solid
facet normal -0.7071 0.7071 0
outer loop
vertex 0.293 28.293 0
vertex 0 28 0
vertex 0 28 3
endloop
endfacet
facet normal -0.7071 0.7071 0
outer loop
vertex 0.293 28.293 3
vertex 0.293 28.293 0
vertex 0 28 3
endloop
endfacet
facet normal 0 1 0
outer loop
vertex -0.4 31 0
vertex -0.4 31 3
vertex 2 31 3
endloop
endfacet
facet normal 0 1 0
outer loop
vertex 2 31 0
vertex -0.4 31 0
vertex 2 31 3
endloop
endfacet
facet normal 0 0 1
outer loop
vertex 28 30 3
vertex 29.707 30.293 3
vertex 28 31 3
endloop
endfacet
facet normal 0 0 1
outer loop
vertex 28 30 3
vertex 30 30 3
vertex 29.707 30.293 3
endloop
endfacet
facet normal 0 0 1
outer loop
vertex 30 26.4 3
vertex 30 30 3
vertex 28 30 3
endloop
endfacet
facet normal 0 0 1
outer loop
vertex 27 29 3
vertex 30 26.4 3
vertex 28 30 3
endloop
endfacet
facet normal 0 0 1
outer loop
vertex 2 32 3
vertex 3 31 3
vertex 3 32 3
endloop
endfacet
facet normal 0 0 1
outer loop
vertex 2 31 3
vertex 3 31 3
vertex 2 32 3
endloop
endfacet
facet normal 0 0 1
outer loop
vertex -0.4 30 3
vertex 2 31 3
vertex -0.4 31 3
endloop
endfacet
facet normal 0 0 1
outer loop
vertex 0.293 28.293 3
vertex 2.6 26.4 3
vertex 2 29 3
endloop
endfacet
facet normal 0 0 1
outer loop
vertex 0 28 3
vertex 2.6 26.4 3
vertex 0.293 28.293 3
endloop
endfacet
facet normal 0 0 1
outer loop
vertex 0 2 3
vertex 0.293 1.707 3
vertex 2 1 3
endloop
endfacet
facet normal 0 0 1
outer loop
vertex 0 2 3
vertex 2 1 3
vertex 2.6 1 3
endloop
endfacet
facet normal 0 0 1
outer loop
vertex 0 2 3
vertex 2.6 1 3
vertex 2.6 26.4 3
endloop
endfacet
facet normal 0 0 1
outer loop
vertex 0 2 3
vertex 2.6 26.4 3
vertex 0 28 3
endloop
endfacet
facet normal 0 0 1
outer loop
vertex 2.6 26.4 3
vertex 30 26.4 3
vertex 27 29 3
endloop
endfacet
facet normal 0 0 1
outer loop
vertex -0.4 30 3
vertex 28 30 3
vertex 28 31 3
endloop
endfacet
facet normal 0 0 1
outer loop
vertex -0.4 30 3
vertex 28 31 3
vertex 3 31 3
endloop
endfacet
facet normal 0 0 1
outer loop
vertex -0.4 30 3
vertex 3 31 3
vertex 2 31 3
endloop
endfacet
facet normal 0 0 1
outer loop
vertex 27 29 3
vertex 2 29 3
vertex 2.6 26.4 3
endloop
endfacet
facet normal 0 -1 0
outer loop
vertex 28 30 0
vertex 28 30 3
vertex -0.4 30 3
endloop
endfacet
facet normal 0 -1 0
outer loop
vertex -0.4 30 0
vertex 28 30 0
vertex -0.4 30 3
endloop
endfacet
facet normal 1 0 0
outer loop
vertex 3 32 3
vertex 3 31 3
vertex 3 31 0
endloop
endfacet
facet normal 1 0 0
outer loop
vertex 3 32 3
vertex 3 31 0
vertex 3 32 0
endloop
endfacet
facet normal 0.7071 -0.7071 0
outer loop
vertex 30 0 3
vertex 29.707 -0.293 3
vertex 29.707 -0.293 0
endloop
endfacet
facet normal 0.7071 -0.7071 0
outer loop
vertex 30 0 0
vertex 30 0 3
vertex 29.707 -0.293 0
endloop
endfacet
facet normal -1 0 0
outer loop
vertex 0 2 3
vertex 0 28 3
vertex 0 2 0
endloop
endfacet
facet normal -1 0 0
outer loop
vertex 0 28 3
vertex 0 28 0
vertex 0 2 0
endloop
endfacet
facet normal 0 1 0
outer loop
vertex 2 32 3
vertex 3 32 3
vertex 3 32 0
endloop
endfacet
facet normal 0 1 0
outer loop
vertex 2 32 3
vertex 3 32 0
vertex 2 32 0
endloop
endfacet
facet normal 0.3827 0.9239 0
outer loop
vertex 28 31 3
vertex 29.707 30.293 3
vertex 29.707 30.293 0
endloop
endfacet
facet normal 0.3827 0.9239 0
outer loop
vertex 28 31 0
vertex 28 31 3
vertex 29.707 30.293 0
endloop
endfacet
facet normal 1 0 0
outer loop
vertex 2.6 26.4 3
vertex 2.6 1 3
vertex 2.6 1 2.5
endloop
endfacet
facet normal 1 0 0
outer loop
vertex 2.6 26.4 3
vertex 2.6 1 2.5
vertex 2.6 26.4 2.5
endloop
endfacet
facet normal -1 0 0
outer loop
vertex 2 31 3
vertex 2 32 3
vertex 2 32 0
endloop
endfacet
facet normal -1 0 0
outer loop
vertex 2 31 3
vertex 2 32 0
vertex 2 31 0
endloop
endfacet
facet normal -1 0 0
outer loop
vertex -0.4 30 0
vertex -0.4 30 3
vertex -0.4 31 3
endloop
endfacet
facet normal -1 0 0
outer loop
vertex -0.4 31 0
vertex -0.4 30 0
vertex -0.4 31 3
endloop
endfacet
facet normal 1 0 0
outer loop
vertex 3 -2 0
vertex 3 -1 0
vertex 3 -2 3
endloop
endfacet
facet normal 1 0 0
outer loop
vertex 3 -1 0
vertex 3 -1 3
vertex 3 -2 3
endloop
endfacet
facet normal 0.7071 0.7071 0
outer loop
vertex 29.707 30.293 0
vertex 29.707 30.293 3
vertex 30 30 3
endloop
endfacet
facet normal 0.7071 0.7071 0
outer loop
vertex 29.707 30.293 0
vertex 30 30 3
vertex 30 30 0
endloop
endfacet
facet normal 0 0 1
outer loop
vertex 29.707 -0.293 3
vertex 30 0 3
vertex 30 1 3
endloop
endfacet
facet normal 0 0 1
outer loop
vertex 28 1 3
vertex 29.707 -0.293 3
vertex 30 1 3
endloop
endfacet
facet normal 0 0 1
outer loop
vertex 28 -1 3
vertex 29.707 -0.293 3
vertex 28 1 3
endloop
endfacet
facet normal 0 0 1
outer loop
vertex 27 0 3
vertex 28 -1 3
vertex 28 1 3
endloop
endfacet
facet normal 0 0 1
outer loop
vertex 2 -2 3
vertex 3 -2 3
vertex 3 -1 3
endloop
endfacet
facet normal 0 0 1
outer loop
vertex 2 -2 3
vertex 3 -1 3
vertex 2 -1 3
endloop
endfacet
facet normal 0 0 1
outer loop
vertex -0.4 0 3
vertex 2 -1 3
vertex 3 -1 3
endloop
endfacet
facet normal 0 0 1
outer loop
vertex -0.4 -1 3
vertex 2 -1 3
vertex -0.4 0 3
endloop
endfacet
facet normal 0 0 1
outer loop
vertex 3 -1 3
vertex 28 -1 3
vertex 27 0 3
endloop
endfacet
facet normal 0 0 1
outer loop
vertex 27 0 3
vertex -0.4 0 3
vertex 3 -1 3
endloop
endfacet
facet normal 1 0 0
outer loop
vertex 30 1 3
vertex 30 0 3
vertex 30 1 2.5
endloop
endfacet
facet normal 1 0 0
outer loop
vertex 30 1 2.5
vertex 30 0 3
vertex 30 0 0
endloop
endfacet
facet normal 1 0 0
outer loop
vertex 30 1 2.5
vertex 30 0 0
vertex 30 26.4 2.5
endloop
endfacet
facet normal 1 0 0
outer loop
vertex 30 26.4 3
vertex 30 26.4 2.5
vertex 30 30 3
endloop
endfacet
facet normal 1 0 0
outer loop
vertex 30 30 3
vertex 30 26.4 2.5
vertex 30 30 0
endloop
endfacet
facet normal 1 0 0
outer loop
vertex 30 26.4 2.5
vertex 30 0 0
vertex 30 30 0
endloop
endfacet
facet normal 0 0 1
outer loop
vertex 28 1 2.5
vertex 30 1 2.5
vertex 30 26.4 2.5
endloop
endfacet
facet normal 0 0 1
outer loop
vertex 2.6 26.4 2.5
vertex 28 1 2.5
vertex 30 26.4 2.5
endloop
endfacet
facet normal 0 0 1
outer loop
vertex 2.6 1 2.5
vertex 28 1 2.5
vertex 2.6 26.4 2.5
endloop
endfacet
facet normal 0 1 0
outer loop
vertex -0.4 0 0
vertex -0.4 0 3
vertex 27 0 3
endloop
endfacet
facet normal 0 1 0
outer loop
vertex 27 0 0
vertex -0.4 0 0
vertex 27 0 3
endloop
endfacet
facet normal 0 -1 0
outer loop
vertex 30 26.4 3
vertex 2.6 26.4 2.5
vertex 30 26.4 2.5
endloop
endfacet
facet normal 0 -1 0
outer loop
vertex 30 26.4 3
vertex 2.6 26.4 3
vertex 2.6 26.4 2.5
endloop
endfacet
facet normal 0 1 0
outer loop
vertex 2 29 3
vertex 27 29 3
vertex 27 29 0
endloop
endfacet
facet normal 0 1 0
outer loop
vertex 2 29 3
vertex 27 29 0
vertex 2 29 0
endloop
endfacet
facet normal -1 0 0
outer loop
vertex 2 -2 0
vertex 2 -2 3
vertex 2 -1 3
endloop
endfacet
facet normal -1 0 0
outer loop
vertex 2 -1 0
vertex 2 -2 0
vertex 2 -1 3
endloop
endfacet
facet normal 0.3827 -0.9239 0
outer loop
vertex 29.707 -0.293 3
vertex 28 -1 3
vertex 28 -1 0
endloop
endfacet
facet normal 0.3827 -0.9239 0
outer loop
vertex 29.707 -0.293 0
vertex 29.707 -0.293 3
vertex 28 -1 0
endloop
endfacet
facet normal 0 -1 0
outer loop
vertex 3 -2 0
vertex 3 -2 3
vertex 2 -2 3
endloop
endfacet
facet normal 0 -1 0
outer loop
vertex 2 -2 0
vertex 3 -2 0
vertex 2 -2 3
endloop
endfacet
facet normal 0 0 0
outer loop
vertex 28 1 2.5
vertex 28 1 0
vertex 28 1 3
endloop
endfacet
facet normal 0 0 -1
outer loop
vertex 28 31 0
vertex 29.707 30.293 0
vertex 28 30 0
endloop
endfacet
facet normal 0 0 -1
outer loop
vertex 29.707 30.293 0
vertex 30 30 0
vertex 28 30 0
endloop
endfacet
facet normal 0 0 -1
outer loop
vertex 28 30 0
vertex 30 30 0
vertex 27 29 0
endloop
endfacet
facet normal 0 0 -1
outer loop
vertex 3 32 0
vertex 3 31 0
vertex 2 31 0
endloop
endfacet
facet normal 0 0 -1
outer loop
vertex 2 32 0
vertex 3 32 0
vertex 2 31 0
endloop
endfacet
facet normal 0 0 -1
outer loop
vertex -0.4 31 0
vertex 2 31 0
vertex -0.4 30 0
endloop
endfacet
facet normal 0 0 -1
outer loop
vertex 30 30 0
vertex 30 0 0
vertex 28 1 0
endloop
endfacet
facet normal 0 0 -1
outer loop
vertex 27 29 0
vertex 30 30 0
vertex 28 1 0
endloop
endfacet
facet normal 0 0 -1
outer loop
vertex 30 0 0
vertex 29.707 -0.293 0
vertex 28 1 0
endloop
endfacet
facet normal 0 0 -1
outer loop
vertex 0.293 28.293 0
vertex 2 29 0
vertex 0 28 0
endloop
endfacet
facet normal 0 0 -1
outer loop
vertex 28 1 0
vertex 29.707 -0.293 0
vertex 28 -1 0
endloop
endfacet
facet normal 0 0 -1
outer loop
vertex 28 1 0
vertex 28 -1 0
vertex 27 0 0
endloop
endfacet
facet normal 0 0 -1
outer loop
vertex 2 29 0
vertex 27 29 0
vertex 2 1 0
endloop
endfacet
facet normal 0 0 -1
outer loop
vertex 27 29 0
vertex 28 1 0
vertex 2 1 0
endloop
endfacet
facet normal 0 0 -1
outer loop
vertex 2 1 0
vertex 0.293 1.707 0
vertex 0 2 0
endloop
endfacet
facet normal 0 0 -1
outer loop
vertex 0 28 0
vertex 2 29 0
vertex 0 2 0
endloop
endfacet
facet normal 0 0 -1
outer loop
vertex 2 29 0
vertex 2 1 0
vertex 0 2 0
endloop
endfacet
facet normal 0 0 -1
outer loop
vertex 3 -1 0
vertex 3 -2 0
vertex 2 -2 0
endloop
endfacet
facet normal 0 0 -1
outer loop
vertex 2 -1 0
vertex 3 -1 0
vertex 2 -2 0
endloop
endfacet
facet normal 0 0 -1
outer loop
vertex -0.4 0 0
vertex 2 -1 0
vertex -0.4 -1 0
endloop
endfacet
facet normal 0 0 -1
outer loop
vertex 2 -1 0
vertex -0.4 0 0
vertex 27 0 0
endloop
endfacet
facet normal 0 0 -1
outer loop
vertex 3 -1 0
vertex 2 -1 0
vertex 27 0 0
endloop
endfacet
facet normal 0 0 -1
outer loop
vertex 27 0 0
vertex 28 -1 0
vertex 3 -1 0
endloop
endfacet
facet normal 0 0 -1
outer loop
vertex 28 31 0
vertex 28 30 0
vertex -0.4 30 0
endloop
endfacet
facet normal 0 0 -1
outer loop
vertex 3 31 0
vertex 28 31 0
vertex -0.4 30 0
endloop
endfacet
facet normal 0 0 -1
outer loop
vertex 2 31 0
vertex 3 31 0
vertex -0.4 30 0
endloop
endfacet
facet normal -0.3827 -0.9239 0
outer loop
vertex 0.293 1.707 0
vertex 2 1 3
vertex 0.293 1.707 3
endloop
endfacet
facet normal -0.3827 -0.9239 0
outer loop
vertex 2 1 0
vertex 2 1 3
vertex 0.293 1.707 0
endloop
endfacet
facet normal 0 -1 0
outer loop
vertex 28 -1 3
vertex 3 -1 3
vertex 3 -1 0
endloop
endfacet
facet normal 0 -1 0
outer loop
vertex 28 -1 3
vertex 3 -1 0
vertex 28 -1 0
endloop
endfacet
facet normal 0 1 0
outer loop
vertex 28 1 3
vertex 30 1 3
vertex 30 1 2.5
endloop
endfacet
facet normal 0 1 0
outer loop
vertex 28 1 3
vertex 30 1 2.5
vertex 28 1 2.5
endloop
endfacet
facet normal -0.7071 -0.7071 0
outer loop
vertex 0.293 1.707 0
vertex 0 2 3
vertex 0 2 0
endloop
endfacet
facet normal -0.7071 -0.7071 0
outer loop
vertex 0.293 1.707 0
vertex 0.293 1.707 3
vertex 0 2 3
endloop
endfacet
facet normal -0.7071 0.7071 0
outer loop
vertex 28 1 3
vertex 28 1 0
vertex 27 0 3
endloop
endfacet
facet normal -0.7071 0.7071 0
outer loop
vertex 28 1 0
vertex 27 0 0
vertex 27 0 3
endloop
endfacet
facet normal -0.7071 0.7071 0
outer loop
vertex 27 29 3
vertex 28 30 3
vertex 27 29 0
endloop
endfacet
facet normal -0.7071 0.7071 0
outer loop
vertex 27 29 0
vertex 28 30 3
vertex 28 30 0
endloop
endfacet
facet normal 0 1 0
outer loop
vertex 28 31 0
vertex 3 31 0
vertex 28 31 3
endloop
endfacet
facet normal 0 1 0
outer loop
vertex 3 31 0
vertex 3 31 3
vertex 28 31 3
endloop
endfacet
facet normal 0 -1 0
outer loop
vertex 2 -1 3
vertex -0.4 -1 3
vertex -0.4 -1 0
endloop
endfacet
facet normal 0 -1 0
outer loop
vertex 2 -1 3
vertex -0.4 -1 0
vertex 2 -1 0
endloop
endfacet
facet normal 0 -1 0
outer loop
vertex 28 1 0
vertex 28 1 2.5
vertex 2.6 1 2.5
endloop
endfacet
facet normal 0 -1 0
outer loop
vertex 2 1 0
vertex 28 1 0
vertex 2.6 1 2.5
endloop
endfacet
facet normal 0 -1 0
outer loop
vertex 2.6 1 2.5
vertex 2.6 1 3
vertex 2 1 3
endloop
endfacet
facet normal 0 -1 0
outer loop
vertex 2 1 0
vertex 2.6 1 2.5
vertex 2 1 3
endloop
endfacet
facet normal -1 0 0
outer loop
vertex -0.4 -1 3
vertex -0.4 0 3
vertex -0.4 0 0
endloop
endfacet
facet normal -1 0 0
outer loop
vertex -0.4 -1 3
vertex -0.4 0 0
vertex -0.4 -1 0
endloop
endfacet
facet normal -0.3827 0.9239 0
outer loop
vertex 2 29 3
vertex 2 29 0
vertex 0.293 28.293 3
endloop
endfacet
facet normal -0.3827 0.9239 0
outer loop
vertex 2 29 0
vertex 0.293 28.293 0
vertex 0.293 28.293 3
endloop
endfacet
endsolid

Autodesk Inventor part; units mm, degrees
ref_plane "YZ Plane" through (0, 0, 0) normal (1, 0, 0) x (0, 1, 0)
ref_plane "XZ Plane" through (0, 0, 0) normal (0, 1, 0) x (-1, 0, 0)
sketch "Sketch1" plane through (0, 0, 0) normal (0, 0, 1) x (1, 0, 0)
  line L0 (0, 0) -> (30, 0)
  line L1 (30, 0) -> (30, 30)
  line L2 (30, 30) -> (0, 30)
  line L3 (0, 30) -> (0, 0)
  dimension "d0" = 30
  dimension "d1" = 30
extrude "Extrusion1" add sketch "Sketch1" along normal blind 3
sketch "Sketch2" plane through (0, 0, 3) normal (0, 0, 1) x (1, 0, 0)
  line L0 (30, 3.6) -> (2.6, 3.6)
  line L1 (2.6, 3.6) -> (2.6, 29)
  line L2 (2.6, 29) -> (30, 29)
  line L3 (30, 29) -> (30, 3.6)
  line L4 (0, 0) -> (30, 0) projected
  line L5 (30, 0) -> (30, 30) projected
  dimension "d4" = 27.4
  dimension "d5" = 25.4
  dimension "d36" = 3.6
extrude "Extrusion2" cut sketch "Sketch2" against normal blind 0.5
sketch "Sketch3" plane through (0, 0, 3) normal (0, 0, 1) x (1, 0, 0)
  line L0 (30, 30) -> (0, 30) projected
  line L1 (0, 30) -> (0, 0) projected
  line L2 (28, 30) -> (0, 30)
  line L3 (0, 30) -> (0, 29)
  line L4 (0, 29) -> (28, 29)
  line L5 (28, 29) -> (28, 30)
  line L6 (30, 29) -> (30, 30) projected
  line L7 (0, 0) -> (30, 0) projected
  line L8 (28, 0) -> (0, 0)
  line L9 (0, 0) -> (0, 1)
  line L10 (0, 1) -> (28, 1)
  line L11 (28, 1) -> (28, 0)
  line L12 (30, 0) -> (30, 3.6) projected
  dimension "d8" = 1
  dimension "d9" = 2
  dimension "d10" = 1
  dimension "d11" = 2
extrude "Extrusion3" cut sketch "Sketch3" against normal through all
sketch "Sketch4" plane through (0, 0, 3) normal (0, 0, 1) x (1, 0, 0)
  line L0 (30, 29) -> (30, 30) projected
  line L1 (30, 30) -> (-0.4, 30)
  line L2 (-0.4, 30) -> (-0.4, 31)
  line L3 (-0.4, 31) -> (30, 31)
  line L4 (30, 31) -> (30, 30)
  line L5 (30, 0) -> (-0.4, 0)
  line L6 (-0.4, 0) -> (-0.4, -1)
  line L7 (-0.4, -1) -> (30, -1)
  line L8 (30, -1) -> (30, 0)
  line L9 (2, 31) -> (3, 31)
  line L10 (3, 31) -> (3, 32)
  line L11 (3, 32) -> (2, 32)
  line L12 (2, 32) -> (2, 31)
  line L13 (2, -1) -> (3, -1)
  line L14 (3, -1) -> (3, -2)
  line L15 (3, -2) -> (2, -2)
  line L16 (2, -2) -> (2, -1)
  line L17 (0, 29) -> (0, 1) projected
  point P0 (0, 0)
  dimension "d14" = 30.4
  dimension "d15" = 1
  dimension "d17" = 1
  dimension "d20" = 1
  dimension "d21" = 1
  dimension "d26" = 1
  dimension "d27" = 1
  dimension "d35" = 2
extrude "Extrusion4" add sketch "Sketch4" against normal blind 3
chamfer "Chamfer1" distance 1 angle 45 4 edges at (30, 31, 1.5) (30, -1, 1.5) (28, 1, 1.5) (28, 30, 1.5)
chamfer "Chamfer2" distance 1 angle 45 2 edges at (29.0001, 31, 1.5) (29.0001, -1, 1.5)
ref_plane "Work Plane1" through (2, 15, 3) normal (0, -1, 0) x (1, 0, 0)
mirror "Mirror1" about plane through (2, 15, 3) normal (0, -1, 0) of "Extrusion1", "Extrusion2", "Extrusion3", "Extrusion4", "Chamfer1", "Chamfer2"
chamfer "Chamfer3" distance 1 angle 45 2 edges at (0, 29, 1.5) (0, 1, 1.5)
chamfer "Chamfer4" distance 1 angle 45 2 edges at (1, 29, 1.5) (1, 1, 1.5)
properties part number "TA10" material "ABS Plastic"
